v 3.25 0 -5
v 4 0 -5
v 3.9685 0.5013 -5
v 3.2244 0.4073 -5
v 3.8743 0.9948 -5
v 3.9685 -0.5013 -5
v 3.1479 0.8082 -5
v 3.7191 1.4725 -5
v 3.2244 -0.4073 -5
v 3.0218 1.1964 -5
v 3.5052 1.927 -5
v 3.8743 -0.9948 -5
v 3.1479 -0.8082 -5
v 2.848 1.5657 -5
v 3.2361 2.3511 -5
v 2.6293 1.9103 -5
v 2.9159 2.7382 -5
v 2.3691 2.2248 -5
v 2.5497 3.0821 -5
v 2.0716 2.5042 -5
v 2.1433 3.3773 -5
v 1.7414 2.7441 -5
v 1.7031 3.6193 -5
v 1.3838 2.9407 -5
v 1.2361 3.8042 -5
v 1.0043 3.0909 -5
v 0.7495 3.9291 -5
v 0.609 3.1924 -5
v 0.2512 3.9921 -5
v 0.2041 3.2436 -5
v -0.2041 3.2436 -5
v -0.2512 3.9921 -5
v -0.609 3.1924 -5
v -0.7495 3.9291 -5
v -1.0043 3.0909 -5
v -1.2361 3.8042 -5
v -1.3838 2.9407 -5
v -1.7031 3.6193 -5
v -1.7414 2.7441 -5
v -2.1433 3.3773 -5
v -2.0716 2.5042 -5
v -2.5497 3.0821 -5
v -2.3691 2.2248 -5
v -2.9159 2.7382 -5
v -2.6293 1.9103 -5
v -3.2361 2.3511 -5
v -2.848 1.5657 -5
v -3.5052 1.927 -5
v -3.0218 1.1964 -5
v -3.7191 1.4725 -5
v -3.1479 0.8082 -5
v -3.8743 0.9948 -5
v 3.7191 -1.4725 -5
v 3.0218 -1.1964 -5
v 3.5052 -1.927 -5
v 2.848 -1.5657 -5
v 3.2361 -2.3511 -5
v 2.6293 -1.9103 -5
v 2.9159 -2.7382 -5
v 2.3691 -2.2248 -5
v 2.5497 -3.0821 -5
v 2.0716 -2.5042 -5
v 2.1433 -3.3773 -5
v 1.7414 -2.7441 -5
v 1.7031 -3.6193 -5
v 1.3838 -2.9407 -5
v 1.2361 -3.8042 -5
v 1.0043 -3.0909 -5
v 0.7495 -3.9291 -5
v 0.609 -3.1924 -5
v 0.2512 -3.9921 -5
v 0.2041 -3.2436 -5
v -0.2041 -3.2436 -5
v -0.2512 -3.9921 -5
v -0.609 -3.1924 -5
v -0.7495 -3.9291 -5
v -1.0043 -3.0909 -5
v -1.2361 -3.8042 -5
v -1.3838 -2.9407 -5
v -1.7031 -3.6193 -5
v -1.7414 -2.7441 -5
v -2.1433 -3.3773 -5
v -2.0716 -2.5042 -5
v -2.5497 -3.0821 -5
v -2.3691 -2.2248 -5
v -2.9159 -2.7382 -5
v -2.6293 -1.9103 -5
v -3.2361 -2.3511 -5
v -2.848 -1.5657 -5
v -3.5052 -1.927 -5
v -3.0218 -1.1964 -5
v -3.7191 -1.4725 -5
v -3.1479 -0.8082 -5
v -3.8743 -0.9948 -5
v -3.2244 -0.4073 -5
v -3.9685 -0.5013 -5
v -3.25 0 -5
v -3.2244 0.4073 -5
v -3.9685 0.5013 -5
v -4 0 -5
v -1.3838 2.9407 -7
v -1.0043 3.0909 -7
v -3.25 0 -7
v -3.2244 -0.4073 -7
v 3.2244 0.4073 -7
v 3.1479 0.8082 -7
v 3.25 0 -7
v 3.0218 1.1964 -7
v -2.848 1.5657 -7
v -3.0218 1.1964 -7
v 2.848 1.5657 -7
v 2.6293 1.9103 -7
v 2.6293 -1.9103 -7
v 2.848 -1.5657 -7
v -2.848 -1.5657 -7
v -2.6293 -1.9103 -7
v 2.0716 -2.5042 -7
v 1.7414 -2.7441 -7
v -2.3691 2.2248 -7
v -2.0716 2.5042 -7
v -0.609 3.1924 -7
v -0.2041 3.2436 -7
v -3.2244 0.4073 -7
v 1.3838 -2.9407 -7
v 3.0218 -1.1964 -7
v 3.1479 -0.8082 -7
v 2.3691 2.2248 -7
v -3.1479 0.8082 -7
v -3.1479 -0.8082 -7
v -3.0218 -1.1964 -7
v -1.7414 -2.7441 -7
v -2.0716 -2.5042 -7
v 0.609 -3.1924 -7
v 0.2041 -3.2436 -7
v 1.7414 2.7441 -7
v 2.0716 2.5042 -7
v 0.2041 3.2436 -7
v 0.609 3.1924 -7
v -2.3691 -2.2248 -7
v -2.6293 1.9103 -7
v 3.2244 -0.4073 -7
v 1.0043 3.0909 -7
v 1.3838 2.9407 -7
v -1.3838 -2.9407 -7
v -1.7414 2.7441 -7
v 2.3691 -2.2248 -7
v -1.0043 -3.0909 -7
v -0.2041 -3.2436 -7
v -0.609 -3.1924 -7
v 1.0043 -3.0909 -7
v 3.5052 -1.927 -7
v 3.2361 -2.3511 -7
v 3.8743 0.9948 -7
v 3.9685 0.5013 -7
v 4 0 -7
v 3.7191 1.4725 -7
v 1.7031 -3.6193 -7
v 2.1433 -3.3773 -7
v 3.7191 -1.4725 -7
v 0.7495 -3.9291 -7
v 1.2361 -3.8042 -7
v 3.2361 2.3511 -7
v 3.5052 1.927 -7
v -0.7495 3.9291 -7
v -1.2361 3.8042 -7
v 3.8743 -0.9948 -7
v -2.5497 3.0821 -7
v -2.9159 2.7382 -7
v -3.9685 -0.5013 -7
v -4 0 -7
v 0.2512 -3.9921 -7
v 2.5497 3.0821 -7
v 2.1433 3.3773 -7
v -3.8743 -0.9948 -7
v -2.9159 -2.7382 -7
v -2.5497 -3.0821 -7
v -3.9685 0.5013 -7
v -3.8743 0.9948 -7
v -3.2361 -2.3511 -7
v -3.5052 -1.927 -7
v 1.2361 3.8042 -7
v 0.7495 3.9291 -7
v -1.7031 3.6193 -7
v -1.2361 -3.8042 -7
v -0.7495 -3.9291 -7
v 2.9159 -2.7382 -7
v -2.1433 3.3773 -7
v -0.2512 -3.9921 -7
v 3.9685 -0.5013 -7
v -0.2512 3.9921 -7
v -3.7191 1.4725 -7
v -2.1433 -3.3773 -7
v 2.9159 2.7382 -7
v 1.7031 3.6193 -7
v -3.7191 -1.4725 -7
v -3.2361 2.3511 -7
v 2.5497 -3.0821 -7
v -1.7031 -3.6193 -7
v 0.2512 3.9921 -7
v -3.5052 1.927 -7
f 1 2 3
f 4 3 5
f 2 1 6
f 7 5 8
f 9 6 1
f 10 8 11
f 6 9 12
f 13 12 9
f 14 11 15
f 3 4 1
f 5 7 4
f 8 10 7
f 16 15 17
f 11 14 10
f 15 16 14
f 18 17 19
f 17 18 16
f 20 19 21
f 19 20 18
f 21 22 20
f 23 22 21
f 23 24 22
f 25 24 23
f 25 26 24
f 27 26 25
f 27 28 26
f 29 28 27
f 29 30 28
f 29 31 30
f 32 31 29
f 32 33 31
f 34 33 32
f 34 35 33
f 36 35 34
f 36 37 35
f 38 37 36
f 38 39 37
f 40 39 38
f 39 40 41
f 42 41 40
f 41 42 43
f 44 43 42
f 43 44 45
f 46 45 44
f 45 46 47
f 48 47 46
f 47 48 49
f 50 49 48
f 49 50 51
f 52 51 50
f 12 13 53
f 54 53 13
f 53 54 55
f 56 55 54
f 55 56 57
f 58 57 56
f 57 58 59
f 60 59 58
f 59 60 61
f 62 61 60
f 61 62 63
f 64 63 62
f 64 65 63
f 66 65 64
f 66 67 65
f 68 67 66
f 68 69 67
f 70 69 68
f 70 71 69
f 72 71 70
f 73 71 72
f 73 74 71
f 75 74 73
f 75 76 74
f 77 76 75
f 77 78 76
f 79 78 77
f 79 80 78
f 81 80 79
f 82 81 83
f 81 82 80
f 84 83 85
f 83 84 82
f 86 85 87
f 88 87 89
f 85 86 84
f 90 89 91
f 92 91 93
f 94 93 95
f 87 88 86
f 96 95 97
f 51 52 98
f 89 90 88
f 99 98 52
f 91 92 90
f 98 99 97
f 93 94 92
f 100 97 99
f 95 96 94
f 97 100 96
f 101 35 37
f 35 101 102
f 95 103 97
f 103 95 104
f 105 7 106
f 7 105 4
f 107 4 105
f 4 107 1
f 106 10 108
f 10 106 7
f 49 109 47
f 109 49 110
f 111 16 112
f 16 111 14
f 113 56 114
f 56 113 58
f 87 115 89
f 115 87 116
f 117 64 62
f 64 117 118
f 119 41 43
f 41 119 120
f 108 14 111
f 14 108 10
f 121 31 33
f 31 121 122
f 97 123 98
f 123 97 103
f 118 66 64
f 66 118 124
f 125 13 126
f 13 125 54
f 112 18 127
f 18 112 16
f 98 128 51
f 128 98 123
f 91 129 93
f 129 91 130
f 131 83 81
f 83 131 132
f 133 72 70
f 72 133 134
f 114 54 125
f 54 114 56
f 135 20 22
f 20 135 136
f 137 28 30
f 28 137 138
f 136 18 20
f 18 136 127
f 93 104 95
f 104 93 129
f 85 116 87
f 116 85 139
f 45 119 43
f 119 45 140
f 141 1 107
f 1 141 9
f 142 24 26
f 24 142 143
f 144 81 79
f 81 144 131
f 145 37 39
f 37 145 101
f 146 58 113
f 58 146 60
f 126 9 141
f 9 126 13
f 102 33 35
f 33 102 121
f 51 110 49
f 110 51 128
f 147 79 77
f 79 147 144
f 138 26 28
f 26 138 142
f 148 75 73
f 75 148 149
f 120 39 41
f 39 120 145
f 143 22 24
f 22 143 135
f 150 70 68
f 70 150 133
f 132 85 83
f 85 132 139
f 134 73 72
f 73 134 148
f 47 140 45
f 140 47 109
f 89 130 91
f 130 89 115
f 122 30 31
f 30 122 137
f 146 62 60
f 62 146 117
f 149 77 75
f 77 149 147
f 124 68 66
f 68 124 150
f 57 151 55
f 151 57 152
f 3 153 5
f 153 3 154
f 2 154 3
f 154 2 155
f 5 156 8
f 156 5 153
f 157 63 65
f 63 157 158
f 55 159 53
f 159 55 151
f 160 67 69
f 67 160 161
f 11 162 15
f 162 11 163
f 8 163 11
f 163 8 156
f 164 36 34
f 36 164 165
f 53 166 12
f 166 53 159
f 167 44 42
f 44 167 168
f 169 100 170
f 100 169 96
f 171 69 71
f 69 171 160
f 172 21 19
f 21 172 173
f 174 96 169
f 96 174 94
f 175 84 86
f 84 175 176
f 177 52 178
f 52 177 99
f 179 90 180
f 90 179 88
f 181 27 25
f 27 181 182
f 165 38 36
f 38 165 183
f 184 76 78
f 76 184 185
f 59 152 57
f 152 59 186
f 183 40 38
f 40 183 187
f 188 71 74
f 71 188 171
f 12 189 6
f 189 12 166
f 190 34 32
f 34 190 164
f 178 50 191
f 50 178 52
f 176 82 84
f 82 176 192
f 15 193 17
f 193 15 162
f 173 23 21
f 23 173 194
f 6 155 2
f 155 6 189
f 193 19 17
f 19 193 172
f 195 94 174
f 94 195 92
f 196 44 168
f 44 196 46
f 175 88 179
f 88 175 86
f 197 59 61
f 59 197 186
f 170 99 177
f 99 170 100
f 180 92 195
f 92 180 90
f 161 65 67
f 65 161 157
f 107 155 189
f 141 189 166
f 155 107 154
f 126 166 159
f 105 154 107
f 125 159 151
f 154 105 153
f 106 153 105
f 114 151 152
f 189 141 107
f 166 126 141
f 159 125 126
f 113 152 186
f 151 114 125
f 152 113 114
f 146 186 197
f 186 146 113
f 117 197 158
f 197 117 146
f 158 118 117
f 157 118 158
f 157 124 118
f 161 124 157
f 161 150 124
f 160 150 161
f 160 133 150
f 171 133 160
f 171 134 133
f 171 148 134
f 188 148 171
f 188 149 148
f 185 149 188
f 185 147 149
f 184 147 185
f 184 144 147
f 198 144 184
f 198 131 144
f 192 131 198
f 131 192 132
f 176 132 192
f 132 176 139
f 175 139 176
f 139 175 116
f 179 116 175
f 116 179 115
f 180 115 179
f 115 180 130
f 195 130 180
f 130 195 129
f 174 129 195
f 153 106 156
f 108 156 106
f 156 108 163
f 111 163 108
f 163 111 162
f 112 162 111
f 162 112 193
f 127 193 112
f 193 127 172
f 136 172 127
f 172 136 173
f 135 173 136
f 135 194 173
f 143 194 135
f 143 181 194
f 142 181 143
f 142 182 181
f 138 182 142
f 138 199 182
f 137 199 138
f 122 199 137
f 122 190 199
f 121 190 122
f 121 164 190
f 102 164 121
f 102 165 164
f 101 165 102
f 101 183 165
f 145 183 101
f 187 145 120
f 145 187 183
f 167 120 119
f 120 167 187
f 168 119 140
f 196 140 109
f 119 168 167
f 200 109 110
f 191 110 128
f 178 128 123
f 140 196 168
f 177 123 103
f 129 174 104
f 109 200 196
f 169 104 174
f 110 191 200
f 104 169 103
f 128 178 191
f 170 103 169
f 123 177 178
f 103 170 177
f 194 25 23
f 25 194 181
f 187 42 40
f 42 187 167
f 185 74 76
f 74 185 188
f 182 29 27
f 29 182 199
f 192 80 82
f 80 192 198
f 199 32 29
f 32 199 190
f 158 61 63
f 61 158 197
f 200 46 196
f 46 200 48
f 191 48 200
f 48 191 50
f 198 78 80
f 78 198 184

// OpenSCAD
$fn = 50;

difference() {
	union() {
		translate(v = [0, 0, -7.0]) {
			cylinder(h = 7.0, r = 4.0);
		}
	}
	union() {
		translate(v = [0, 0, 0]) {
			rotate(a = [0, 0, 0]) {
				difference() {
					union() {
						translate(v = [0, 0, -5]) {
							linear_extrude(height = 5) {
								polygon(points = [[5.914249999999999, 0.0], [2.957125, 5.1218907443321156], [-2.9571249999999982, 5.1218907443321156], [-5.914249999999999, 7.242867331857232e-16], [-2.9571250000000022, -5.121890744332115], [2.9571249999999956, -5.121890744332118]]);
							}
						}
					}
					union();
				}
			}
		}
		#translate(v = [0, 0, -100.0]) {
			cylinder(h = 200, r = 3.25);
		}
	}
}
